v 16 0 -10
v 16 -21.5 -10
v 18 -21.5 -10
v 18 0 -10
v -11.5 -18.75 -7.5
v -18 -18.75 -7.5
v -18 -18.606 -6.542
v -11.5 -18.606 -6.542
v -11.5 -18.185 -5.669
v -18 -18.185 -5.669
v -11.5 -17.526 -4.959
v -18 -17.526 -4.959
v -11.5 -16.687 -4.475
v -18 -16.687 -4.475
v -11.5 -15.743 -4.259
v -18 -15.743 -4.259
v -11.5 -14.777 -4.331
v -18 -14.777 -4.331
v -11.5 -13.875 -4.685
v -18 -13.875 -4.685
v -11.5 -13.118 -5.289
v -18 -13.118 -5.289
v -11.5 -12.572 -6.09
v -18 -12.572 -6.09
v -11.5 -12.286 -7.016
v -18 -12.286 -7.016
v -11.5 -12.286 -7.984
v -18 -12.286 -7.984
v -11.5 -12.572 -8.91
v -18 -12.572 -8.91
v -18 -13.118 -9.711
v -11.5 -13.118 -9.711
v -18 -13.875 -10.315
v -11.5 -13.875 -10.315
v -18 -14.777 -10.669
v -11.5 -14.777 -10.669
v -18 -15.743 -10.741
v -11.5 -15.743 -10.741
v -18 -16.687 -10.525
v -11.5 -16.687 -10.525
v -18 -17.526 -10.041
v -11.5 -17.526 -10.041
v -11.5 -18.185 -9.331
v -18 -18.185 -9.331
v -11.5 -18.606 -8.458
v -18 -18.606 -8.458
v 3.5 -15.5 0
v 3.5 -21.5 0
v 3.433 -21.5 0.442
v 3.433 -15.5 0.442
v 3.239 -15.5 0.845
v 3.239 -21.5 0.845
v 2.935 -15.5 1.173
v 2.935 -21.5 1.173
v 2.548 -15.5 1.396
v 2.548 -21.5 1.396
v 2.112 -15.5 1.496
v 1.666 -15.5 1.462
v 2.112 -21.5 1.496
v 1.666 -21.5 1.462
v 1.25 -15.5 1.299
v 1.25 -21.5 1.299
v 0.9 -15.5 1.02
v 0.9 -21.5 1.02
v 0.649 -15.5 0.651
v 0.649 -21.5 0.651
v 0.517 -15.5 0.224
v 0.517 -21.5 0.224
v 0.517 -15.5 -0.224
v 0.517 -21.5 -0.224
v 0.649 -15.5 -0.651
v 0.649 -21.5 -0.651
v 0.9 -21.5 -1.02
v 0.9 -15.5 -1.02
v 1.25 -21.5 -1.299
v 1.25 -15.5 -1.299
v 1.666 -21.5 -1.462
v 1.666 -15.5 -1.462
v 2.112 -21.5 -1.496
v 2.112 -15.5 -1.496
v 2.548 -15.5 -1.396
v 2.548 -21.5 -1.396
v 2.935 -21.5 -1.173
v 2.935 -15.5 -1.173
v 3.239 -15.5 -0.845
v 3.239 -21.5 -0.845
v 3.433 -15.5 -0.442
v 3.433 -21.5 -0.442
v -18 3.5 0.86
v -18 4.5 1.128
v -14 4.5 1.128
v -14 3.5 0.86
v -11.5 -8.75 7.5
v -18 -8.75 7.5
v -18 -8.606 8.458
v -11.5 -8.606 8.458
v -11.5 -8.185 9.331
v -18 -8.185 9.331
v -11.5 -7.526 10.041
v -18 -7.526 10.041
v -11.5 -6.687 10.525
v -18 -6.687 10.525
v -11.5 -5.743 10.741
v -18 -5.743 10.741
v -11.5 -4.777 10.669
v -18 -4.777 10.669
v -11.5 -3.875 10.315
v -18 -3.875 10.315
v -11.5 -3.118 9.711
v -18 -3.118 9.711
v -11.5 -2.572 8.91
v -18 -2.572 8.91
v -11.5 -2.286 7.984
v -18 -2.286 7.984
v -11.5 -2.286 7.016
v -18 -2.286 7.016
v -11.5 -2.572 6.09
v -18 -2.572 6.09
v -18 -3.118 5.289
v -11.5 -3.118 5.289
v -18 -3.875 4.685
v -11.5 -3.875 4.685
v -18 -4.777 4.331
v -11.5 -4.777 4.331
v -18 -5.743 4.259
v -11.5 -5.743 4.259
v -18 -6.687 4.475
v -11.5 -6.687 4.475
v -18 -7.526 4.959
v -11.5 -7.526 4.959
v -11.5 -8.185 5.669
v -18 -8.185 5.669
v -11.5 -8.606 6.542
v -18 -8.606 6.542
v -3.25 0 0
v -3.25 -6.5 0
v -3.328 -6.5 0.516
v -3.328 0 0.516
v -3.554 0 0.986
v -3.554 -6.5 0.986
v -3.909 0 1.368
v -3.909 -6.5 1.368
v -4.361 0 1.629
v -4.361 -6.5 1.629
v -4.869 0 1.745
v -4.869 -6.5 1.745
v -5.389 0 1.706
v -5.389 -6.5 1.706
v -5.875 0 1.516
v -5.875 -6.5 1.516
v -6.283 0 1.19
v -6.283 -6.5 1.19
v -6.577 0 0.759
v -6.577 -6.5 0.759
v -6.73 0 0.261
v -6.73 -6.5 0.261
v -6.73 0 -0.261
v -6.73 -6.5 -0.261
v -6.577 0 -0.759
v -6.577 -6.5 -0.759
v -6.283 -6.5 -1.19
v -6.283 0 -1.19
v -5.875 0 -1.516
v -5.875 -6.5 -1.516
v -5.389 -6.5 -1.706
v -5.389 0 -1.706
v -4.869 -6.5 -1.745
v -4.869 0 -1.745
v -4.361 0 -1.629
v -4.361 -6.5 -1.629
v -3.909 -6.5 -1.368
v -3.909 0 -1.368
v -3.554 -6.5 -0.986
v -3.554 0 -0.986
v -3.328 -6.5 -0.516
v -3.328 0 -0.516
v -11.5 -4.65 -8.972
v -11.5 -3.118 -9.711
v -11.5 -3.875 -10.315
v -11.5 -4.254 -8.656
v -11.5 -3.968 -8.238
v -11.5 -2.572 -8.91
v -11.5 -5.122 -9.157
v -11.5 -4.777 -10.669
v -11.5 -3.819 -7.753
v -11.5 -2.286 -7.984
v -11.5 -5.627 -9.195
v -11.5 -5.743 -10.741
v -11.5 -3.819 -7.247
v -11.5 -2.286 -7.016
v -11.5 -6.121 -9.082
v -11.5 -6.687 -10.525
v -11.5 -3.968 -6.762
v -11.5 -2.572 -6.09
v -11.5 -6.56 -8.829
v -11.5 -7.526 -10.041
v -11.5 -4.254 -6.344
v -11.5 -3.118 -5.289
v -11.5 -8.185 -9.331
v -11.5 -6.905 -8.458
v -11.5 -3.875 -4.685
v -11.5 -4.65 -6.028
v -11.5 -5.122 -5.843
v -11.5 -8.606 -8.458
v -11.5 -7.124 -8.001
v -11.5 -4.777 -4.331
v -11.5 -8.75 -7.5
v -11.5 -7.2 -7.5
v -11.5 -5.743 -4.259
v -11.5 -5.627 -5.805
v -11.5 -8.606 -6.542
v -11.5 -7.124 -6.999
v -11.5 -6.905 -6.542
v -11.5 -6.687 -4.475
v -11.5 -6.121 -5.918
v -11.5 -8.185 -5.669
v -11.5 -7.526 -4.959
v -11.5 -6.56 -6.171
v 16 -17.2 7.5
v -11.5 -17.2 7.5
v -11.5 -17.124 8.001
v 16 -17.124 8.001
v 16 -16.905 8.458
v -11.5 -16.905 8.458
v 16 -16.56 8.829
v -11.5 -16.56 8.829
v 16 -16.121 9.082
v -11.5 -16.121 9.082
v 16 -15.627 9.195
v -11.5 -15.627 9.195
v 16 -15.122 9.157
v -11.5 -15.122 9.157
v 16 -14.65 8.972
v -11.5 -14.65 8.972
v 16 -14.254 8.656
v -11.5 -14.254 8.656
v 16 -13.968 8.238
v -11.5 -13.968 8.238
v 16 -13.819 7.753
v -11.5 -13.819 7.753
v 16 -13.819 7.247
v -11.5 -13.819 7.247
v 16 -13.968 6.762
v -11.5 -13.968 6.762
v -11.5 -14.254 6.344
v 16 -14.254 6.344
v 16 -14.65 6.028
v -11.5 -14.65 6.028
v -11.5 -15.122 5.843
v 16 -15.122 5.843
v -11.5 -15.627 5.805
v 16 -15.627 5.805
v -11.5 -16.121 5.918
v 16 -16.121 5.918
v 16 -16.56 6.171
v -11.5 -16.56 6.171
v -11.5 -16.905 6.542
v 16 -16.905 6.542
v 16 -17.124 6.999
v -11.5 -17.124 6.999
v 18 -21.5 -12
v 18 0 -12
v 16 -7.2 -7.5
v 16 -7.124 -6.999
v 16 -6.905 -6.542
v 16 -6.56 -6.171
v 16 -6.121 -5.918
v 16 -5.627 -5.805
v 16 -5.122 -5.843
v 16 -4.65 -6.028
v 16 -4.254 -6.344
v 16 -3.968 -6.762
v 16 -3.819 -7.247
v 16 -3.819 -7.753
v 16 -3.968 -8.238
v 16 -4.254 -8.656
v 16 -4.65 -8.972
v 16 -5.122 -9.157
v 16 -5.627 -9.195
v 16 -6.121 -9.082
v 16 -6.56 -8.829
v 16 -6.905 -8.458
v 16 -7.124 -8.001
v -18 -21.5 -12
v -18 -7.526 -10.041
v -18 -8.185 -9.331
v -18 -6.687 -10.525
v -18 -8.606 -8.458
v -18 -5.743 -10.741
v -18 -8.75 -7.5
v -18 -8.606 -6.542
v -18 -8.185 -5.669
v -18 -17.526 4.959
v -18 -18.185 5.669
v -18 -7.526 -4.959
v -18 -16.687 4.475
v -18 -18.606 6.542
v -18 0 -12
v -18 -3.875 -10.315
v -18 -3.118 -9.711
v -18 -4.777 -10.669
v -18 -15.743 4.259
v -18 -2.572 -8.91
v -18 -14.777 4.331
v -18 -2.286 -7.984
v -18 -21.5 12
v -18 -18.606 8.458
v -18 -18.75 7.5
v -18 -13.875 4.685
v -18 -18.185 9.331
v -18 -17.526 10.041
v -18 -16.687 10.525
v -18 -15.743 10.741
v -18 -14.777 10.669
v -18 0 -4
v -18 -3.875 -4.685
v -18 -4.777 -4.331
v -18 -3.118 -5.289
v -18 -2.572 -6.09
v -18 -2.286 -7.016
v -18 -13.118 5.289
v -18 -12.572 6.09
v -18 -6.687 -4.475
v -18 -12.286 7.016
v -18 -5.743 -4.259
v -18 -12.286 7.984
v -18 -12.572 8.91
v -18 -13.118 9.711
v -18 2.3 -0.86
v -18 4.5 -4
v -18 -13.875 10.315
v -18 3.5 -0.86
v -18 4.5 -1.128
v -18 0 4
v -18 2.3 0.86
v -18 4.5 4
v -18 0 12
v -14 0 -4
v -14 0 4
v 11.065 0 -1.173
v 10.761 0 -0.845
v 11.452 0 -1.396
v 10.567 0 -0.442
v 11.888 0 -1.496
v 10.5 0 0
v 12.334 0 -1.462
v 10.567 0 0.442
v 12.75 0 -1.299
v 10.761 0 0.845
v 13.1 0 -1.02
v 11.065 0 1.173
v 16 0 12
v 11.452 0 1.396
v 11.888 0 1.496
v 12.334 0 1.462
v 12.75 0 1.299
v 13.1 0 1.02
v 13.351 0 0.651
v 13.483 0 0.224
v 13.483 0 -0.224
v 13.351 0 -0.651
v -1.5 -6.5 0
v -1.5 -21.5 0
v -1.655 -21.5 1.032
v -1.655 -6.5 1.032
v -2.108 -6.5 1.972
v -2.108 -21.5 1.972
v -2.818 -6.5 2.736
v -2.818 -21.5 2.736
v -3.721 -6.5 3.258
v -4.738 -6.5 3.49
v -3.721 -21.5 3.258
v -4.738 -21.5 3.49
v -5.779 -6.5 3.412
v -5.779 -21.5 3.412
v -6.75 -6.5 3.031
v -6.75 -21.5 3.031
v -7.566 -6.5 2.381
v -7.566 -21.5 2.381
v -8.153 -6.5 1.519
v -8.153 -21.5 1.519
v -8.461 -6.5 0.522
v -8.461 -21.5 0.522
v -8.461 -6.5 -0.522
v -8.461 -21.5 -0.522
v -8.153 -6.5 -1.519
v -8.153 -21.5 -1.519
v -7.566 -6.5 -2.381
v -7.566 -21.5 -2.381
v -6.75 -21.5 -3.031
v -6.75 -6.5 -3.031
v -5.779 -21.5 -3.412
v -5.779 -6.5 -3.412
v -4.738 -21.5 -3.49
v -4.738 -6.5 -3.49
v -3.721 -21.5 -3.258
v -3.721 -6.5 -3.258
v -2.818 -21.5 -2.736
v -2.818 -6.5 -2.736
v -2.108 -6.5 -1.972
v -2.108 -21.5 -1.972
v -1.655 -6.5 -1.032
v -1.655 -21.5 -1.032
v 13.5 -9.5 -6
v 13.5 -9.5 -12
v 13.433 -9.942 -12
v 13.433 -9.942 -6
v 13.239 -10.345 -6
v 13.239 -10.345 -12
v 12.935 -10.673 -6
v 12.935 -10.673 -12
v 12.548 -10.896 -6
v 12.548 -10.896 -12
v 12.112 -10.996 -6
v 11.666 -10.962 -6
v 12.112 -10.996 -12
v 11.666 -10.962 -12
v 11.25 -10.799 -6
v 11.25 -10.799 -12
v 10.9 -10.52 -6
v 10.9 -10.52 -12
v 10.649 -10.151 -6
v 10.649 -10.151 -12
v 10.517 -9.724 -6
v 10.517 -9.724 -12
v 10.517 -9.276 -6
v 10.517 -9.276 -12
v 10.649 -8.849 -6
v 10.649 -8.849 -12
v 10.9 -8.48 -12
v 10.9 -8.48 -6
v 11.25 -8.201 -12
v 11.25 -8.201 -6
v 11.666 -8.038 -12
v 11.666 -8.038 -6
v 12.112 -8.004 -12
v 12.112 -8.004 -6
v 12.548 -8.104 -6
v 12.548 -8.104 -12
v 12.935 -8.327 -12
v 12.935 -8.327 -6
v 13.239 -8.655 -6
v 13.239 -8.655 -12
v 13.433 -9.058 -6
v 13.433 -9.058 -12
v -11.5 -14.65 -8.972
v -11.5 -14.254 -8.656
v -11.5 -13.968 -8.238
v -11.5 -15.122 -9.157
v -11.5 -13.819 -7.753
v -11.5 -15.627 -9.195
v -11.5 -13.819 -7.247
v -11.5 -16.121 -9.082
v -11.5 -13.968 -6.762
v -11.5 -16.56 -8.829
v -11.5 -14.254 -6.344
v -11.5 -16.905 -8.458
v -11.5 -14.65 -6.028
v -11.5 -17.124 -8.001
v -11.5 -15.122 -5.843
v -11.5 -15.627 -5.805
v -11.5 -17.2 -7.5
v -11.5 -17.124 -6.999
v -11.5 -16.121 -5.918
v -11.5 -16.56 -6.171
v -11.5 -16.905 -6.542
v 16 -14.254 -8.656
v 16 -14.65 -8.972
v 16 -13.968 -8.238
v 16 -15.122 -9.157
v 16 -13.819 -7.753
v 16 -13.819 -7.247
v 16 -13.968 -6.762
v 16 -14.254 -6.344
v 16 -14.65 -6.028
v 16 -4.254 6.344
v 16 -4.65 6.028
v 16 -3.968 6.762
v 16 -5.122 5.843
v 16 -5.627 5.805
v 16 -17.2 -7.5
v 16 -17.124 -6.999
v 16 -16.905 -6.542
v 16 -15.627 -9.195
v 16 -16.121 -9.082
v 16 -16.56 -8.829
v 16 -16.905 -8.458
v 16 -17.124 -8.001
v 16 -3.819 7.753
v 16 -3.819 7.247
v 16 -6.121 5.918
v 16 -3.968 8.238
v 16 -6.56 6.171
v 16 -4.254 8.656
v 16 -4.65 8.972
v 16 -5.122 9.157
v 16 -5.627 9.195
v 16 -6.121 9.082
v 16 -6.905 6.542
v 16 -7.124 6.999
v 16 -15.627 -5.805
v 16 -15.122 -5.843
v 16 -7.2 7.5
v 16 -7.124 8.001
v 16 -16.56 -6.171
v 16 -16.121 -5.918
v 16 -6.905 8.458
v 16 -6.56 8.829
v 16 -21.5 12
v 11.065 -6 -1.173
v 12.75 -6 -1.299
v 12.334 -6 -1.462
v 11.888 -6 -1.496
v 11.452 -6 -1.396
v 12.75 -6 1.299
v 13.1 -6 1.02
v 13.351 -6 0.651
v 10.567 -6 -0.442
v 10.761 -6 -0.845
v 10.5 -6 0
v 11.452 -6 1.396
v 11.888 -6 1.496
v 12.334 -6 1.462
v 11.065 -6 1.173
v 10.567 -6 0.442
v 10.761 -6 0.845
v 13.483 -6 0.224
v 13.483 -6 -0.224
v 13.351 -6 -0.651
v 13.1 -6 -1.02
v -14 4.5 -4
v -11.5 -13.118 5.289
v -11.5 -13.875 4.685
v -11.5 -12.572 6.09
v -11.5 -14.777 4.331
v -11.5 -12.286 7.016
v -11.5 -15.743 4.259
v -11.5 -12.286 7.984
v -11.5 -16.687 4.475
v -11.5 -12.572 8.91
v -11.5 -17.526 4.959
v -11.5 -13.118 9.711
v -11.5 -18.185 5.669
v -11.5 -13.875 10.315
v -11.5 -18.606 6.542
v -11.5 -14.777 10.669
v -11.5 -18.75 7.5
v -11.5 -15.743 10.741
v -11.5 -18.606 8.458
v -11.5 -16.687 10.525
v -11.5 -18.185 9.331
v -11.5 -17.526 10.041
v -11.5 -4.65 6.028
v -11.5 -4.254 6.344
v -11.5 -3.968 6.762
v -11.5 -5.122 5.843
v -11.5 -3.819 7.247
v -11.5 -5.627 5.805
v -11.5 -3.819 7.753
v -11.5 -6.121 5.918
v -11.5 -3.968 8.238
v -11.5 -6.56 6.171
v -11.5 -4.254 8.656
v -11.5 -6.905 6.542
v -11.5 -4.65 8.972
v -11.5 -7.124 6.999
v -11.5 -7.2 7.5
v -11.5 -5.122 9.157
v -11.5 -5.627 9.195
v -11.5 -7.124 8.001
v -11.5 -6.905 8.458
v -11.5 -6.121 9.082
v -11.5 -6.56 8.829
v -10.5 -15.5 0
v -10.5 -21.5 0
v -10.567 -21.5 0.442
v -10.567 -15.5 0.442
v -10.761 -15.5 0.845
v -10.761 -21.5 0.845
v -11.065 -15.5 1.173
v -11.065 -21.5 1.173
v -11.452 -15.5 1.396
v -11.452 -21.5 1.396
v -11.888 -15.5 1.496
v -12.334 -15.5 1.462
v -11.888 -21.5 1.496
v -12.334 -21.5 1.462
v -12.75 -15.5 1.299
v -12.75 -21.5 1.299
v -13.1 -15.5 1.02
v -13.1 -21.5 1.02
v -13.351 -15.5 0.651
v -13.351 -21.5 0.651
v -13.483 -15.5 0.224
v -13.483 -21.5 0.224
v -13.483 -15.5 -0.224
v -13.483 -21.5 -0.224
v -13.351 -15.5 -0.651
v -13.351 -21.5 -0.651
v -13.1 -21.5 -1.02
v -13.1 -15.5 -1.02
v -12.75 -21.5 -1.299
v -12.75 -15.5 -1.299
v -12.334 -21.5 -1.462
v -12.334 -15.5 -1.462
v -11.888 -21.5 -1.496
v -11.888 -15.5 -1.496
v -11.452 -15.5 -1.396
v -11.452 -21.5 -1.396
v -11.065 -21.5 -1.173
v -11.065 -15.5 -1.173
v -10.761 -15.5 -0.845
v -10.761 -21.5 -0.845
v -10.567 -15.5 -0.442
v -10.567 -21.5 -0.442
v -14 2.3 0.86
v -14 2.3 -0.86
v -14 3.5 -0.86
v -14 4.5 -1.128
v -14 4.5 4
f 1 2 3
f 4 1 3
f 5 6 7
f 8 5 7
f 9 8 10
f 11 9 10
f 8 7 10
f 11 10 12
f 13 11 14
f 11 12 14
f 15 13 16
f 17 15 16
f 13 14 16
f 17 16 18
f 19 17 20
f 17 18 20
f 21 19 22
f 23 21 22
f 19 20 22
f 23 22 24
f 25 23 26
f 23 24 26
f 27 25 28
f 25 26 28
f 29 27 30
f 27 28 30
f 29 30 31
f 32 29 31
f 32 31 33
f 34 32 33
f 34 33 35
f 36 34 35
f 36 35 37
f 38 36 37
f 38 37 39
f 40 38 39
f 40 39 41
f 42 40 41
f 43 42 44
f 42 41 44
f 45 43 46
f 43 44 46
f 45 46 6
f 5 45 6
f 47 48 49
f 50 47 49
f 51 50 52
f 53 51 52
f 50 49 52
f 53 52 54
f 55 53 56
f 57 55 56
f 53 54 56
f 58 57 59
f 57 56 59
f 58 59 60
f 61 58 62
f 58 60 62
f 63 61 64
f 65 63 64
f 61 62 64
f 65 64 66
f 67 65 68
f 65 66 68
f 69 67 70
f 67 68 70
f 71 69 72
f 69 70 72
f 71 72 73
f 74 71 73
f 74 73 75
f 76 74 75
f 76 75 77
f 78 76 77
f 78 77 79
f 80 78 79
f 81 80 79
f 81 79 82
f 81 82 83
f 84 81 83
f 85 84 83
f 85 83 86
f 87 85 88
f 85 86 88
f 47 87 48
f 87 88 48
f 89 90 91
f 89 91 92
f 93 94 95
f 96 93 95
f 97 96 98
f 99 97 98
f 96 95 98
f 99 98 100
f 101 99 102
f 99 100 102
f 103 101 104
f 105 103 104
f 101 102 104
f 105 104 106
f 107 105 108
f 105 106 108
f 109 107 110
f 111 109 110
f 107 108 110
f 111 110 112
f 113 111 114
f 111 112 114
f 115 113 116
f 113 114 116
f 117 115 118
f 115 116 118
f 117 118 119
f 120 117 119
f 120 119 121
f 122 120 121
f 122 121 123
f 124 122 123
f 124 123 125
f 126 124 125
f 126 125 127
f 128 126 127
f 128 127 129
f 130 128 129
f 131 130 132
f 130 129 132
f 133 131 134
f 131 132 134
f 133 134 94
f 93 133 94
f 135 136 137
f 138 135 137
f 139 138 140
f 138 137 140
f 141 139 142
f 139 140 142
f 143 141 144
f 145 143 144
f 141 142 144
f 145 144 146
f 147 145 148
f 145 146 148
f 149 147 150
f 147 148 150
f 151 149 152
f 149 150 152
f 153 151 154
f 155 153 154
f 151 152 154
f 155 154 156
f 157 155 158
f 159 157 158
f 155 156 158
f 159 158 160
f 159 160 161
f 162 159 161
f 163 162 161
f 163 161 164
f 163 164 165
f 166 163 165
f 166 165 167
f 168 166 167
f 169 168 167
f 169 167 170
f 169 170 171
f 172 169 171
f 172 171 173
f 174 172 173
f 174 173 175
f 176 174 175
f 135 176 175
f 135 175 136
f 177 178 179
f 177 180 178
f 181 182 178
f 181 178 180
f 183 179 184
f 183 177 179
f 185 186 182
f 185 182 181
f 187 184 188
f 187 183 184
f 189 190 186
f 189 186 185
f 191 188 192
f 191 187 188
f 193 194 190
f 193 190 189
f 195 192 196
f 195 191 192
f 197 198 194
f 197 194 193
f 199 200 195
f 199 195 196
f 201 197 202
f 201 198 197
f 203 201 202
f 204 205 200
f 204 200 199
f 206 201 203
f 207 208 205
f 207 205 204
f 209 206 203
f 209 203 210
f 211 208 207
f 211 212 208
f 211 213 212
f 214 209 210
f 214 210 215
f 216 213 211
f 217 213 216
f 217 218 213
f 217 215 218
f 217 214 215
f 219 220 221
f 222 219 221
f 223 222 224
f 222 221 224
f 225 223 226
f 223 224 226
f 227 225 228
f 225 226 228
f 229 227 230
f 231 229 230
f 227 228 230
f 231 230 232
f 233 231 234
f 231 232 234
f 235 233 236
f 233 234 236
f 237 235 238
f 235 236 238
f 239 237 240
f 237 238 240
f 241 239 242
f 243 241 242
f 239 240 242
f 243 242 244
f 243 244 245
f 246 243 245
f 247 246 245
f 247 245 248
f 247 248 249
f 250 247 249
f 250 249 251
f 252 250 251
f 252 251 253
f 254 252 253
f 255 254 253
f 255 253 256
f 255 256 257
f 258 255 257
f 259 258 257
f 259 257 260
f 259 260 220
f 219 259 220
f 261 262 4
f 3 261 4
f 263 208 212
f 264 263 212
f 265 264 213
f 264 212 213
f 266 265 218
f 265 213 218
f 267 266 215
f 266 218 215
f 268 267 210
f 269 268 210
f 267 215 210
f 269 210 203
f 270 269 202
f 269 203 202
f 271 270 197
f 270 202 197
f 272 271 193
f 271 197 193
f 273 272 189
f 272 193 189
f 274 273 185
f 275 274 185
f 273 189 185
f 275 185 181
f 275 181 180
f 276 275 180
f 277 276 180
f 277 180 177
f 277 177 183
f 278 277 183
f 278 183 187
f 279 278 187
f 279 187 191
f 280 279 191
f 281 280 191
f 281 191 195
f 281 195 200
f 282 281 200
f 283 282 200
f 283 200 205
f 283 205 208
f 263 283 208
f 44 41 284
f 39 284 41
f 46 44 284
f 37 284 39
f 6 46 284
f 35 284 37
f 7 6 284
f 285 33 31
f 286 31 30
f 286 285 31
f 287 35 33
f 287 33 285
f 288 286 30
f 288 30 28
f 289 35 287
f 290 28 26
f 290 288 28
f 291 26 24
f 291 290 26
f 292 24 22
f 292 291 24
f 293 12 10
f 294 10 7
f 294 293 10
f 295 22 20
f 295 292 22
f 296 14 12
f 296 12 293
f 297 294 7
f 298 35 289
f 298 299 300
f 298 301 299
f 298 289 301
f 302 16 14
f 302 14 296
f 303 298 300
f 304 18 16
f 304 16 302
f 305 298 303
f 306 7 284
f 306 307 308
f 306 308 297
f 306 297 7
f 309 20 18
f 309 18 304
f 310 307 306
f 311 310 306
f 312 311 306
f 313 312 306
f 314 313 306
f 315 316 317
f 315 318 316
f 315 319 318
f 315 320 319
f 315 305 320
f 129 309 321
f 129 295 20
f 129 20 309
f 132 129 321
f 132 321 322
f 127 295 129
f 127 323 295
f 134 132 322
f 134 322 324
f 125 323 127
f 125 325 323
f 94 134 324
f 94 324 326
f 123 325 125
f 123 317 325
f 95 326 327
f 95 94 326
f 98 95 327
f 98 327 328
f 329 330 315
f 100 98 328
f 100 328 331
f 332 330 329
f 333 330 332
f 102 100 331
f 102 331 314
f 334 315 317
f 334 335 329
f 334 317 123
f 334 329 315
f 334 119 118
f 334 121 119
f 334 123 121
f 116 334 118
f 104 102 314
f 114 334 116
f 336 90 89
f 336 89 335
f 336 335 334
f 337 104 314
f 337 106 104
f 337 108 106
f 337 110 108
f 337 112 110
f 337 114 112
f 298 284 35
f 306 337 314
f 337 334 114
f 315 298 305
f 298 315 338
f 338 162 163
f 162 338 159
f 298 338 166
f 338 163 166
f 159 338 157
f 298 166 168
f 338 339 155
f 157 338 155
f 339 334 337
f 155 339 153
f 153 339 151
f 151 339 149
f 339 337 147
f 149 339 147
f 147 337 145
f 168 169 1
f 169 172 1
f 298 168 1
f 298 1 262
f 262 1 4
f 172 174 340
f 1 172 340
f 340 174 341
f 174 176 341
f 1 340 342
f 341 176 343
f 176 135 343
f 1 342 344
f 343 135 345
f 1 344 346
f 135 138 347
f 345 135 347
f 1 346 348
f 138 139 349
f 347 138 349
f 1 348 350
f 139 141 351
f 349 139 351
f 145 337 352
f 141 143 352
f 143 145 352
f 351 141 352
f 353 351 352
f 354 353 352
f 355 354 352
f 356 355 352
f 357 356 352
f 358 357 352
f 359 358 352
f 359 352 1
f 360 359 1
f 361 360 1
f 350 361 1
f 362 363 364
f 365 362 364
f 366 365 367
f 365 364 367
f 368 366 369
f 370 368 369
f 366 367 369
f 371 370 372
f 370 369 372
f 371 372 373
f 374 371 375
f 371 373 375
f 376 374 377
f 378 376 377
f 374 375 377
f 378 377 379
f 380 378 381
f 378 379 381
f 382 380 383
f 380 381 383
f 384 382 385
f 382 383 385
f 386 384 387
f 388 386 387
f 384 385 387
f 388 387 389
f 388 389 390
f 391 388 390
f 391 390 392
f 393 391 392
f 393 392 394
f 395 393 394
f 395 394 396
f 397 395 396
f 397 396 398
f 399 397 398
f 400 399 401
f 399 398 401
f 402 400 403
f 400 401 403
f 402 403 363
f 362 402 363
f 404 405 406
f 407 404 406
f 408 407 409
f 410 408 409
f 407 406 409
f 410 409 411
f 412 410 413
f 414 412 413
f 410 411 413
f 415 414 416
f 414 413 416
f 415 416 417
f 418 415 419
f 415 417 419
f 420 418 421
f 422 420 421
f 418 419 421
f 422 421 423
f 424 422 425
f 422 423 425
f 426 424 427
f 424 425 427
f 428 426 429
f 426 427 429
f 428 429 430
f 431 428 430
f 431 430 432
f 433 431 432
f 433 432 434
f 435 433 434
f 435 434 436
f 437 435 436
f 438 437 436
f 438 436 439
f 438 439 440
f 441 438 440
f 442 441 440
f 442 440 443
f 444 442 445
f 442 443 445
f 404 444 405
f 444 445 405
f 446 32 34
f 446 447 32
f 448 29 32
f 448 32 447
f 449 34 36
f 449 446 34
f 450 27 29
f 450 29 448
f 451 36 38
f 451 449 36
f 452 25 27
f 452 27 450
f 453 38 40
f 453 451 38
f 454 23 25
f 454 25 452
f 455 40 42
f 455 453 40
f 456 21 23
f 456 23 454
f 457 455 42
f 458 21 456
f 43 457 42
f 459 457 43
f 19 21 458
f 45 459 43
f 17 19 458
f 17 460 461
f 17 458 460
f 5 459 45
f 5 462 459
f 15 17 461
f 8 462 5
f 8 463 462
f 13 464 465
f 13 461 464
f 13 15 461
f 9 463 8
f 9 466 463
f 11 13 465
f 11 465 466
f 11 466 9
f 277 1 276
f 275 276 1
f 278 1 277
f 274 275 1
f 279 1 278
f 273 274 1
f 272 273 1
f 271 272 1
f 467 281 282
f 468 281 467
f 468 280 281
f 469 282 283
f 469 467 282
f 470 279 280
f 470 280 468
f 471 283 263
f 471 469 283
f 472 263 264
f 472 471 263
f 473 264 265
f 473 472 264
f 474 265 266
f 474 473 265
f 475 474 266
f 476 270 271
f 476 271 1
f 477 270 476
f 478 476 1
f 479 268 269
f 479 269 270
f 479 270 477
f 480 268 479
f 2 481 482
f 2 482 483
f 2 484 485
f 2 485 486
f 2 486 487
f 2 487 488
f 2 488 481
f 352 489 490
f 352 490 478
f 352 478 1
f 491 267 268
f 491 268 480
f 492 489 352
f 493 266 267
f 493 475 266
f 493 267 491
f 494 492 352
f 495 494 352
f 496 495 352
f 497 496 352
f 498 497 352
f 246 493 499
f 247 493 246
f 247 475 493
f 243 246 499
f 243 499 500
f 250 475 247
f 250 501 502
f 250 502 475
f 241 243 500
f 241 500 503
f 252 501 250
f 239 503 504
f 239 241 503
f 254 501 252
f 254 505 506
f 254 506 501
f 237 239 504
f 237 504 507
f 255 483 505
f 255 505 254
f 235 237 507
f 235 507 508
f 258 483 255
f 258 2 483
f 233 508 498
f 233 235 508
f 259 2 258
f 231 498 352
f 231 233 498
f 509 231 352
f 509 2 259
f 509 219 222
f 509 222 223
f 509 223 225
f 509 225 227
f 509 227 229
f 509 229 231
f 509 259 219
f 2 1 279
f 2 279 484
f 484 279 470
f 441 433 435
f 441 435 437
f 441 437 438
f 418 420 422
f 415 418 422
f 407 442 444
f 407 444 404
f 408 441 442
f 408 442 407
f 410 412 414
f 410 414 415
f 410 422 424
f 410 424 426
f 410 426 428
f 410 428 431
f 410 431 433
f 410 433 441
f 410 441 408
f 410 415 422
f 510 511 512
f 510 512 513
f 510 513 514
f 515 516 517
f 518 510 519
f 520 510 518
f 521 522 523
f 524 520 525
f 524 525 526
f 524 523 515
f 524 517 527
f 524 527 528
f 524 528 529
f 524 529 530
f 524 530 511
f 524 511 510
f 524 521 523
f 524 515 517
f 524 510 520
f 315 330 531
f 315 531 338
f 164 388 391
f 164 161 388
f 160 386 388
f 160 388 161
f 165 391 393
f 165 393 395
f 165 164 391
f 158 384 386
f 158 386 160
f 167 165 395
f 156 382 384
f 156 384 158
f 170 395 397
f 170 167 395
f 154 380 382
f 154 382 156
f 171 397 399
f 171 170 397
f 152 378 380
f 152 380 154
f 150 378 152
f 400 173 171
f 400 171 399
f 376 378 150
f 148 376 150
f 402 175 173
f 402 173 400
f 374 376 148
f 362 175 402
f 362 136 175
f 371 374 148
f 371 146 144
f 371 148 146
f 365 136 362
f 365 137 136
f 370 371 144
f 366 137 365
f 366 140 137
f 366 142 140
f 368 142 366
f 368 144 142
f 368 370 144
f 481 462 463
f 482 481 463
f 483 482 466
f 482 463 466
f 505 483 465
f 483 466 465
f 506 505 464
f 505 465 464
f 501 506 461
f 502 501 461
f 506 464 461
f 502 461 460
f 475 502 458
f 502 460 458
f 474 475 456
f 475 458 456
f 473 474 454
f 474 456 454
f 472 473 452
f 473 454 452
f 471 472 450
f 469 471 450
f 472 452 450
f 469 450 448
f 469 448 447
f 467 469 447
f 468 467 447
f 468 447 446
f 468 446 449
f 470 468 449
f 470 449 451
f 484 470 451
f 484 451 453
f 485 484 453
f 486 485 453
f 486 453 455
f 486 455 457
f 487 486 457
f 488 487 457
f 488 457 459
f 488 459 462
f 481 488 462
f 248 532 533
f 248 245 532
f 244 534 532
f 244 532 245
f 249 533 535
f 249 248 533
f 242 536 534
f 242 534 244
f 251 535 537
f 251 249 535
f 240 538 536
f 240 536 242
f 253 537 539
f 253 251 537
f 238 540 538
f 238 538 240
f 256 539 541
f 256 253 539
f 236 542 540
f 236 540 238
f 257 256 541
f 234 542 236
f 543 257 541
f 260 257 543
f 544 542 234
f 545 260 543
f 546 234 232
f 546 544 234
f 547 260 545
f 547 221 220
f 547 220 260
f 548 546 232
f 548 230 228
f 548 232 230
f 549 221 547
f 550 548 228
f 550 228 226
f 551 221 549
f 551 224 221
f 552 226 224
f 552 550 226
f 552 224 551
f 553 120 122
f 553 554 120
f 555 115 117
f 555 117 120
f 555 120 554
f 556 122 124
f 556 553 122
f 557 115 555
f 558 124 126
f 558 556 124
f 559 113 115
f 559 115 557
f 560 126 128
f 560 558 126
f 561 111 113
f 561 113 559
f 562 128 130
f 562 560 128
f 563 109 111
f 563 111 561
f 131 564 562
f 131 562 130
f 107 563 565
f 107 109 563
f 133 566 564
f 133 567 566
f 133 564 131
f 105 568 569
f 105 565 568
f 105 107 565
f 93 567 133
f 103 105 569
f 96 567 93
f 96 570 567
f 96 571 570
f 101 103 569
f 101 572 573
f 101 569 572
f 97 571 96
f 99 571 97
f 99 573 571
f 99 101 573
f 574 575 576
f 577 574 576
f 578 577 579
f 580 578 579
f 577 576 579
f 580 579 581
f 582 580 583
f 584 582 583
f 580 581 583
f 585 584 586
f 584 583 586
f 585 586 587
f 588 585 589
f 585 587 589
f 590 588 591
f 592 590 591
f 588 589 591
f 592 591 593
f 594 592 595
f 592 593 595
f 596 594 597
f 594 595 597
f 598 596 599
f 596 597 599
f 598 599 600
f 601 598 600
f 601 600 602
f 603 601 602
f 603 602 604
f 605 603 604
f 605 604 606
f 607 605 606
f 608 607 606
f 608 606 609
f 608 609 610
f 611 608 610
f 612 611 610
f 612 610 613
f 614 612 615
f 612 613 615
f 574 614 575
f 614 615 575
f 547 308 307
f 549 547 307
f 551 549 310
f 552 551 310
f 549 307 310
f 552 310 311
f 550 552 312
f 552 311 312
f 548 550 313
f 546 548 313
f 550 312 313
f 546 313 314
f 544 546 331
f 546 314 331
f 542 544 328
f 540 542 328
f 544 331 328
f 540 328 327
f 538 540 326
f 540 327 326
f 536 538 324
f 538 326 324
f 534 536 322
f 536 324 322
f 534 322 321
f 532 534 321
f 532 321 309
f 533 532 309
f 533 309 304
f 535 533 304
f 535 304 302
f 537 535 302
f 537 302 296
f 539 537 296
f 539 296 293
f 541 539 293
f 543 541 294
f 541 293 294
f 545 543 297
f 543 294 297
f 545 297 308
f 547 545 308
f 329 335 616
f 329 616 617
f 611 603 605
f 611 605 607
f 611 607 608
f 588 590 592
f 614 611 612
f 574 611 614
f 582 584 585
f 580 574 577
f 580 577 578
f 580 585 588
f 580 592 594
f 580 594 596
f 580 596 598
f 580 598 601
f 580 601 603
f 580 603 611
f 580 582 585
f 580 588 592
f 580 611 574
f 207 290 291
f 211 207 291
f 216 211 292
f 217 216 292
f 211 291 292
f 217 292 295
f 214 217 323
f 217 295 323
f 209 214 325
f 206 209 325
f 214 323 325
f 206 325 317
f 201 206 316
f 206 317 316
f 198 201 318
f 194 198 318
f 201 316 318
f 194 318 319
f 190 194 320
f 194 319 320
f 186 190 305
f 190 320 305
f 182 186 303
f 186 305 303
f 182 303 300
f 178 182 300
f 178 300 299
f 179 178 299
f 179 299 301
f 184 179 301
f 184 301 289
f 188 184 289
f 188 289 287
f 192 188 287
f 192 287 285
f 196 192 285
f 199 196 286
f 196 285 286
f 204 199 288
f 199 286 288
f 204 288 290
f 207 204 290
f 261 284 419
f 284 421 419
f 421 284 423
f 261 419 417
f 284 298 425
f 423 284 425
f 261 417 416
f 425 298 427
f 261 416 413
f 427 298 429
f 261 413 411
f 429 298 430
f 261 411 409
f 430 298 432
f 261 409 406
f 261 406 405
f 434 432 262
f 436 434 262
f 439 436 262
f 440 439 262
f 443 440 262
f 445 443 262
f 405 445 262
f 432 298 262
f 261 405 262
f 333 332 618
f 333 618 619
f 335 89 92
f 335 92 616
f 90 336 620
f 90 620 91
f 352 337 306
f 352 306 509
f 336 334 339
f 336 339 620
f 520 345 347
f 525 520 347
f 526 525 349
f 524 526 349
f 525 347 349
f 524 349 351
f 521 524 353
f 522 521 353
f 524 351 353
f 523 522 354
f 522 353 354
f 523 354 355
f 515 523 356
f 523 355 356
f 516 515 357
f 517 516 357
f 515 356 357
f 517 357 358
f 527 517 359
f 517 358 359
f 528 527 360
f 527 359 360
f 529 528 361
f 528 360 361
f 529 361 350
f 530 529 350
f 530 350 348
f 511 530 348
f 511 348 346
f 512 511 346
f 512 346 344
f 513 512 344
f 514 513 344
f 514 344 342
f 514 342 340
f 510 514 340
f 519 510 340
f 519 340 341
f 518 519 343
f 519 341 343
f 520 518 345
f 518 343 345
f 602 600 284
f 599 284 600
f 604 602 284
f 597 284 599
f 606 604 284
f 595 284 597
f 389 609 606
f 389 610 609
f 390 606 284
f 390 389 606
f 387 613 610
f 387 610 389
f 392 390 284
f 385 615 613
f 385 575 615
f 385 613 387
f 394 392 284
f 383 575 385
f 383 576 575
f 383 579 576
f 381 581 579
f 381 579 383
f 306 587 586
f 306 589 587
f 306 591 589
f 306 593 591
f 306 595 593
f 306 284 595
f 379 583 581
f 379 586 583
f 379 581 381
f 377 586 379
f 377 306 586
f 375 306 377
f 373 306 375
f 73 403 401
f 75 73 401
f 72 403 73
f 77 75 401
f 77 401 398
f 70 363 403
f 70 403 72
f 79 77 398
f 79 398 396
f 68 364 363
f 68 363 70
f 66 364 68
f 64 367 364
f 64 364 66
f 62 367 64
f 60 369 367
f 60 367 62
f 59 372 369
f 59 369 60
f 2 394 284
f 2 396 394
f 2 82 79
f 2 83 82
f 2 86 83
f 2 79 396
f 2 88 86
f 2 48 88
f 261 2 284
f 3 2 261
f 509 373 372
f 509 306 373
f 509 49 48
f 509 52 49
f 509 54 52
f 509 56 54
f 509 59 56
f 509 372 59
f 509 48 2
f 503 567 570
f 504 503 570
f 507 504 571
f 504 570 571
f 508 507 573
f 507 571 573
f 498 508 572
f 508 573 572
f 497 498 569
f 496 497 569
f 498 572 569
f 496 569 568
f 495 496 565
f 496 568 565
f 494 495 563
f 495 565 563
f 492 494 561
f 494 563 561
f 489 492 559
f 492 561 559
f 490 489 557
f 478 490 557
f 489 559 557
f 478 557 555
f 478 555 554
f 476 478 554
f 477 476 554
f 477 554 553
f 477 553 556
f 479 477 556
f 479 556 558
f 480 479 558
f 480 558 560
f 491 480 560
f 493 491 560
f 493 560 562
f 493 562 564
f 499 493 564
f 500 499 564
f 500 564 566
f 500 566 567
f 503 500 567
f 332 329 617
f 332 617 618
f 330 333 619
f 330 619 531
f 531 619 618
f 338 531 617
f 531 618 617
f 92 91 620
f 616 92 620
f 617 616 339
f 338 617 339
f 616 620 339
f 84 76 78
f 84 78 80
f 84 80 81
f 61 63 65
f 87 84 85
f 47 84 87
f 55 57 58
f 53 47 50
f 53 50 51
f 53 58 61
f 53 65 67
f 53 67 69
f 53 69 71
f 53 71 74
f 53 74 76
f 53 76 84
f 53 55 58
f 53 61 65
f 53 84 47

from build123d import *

# Parameters (mm, degrees)
F0_W      = 36
F0_H      = 24
F1_DEPTH  = 21.5
F2_R      = 1.7
F3_DEPTH  = 36.001
F5_DEPTH  = 4
F6_R      = 3.25
F7_DEPTH  = 6.5
F8_R      = 1.5
F9_DEPTH  = 6
F10_W     = 2
F10_H     = 22
F10_R     = 1.75
F11_DEPTH = 26.001
F12_R     = 3.5
F13_DEPTH = 15
F14_R     = 1.5
F15_DEPTH = 6
F16_R     = 1.5
F17_DEPTH = 6


with BuildPart() as f1:
    # F0 (on Front) → F1 (new body)
    with BuildSketch(Plane.XZ):
        Rectangle(F0_W, F0_H)
    extrude(amount=F1_DEPTH)

    # F2 (on face) → F3 (cut, through all)
    with BuildSketch(Plane(origin=(-18, 0, 0), x_dir=(0, -1, 0), z_dir=(-1, 0, 0))):
        with Locations((15.5, 7.5)):
            Circle(F2_R)
        with Locations((5.5, -7.5)):
            Circle(F2_R)
        with Locations((5.5, 7.5)):
            Circle(F2_R)
        with Locations((15.5, -7.5)):
            Circle(F2_R)
    extrude(amount=-F3_DEPTH, mode=Mode.SUBTRACT)

    # F4 (on face) → F5 (join)
    with BuildSketch(Plane(origin=(-18, 0, 0), x_dir=(0, -1, 0), z_dir=(-1, 0, 0))):
        Polygon((0, -4), (0, 4), (-4.5, 4), (-4.5, 1.127949), (-3.5, 0.86), (-2.3, 0.86), (-2.3, -0.86), (-3.5, -0.86), (-4.5, -1.127949), (-4.5, -4), align=None)
    extrude(amount=-F5_DEPTH)

    # F6 (on face) → F7 (cut)
    with BuildSketch(Plane(origin=(-18, 0, 0), x_dir=(0, -1, 0), z_dir=(-1, 0, 0))):
        with Locations((15.5, 7.5)):
            Circle(F6_R)
        with Locations((5.5, 7.5)):
            Circle(F6_R)
        with Locations((5.5, -7.5)):
            Circle(F6_R)
        with Locations((15.5, -7.5)):
            Circle(F6_R)
    extrude(amount=-F7_DEPTH, mode=Mode.SUBTRACT)

    # F8 (on face) → F9 (cut)
    with BuildSketch(Plane.XZ.offset(21.5)):
        with Locations((-12, 0)):
            Circle(F8_R)
        with Locations((2, 0)):
            Circle(F8_R)
    extrude(amount=-F9_DEPTH, mode=Mode.SUBTRACT)

    # F10 (on face) → F11 (cut, through all)
    with BuildSketch(Plane.XZ.offset(21.5)):
        with Locations((17, 1)):
            Rectangle(F10_W, F10_H)
        with Locations((-5, 0)):
            Circle(F10_R)
    extrude(amount=-F11_DEPTH, mode=Mode.SUBTRACT)

    # F12 (on face) → F13 (cut)
    with BuildSketch(Plane.XZ.offset(21.5)):
        with Locations((-5, 0)):
            Circle(F12_R)
    extrude(amount=-F13_DEPTH, mode=Mode.SUBTRACT)

    # F14 (on face) → F15 (cut)
    with BuildSketch(Plane(origin=(0, 0, -12), x_dir=(1, 0, 0), z_dir=(0, 0, -1))):
        with Locations((12, 9.5)):
            Circle(F14_R)
    extrude(amount=-F15_DEPTH, mode=Mode.SUBTRACT)

    # F16 (on face) → F17 (cut)
    with BuildSketch(Plane(origin=(0, 0, 0), x_dir=(-1, 0, 0), z_dir=(0, 1, 0))):
        with Locations((-12, 0)):
            Circle(F16_R)
    extrude(amount=-F17_DEPTH, mode=Mode.SUBTRACT)


solid = f1.part
